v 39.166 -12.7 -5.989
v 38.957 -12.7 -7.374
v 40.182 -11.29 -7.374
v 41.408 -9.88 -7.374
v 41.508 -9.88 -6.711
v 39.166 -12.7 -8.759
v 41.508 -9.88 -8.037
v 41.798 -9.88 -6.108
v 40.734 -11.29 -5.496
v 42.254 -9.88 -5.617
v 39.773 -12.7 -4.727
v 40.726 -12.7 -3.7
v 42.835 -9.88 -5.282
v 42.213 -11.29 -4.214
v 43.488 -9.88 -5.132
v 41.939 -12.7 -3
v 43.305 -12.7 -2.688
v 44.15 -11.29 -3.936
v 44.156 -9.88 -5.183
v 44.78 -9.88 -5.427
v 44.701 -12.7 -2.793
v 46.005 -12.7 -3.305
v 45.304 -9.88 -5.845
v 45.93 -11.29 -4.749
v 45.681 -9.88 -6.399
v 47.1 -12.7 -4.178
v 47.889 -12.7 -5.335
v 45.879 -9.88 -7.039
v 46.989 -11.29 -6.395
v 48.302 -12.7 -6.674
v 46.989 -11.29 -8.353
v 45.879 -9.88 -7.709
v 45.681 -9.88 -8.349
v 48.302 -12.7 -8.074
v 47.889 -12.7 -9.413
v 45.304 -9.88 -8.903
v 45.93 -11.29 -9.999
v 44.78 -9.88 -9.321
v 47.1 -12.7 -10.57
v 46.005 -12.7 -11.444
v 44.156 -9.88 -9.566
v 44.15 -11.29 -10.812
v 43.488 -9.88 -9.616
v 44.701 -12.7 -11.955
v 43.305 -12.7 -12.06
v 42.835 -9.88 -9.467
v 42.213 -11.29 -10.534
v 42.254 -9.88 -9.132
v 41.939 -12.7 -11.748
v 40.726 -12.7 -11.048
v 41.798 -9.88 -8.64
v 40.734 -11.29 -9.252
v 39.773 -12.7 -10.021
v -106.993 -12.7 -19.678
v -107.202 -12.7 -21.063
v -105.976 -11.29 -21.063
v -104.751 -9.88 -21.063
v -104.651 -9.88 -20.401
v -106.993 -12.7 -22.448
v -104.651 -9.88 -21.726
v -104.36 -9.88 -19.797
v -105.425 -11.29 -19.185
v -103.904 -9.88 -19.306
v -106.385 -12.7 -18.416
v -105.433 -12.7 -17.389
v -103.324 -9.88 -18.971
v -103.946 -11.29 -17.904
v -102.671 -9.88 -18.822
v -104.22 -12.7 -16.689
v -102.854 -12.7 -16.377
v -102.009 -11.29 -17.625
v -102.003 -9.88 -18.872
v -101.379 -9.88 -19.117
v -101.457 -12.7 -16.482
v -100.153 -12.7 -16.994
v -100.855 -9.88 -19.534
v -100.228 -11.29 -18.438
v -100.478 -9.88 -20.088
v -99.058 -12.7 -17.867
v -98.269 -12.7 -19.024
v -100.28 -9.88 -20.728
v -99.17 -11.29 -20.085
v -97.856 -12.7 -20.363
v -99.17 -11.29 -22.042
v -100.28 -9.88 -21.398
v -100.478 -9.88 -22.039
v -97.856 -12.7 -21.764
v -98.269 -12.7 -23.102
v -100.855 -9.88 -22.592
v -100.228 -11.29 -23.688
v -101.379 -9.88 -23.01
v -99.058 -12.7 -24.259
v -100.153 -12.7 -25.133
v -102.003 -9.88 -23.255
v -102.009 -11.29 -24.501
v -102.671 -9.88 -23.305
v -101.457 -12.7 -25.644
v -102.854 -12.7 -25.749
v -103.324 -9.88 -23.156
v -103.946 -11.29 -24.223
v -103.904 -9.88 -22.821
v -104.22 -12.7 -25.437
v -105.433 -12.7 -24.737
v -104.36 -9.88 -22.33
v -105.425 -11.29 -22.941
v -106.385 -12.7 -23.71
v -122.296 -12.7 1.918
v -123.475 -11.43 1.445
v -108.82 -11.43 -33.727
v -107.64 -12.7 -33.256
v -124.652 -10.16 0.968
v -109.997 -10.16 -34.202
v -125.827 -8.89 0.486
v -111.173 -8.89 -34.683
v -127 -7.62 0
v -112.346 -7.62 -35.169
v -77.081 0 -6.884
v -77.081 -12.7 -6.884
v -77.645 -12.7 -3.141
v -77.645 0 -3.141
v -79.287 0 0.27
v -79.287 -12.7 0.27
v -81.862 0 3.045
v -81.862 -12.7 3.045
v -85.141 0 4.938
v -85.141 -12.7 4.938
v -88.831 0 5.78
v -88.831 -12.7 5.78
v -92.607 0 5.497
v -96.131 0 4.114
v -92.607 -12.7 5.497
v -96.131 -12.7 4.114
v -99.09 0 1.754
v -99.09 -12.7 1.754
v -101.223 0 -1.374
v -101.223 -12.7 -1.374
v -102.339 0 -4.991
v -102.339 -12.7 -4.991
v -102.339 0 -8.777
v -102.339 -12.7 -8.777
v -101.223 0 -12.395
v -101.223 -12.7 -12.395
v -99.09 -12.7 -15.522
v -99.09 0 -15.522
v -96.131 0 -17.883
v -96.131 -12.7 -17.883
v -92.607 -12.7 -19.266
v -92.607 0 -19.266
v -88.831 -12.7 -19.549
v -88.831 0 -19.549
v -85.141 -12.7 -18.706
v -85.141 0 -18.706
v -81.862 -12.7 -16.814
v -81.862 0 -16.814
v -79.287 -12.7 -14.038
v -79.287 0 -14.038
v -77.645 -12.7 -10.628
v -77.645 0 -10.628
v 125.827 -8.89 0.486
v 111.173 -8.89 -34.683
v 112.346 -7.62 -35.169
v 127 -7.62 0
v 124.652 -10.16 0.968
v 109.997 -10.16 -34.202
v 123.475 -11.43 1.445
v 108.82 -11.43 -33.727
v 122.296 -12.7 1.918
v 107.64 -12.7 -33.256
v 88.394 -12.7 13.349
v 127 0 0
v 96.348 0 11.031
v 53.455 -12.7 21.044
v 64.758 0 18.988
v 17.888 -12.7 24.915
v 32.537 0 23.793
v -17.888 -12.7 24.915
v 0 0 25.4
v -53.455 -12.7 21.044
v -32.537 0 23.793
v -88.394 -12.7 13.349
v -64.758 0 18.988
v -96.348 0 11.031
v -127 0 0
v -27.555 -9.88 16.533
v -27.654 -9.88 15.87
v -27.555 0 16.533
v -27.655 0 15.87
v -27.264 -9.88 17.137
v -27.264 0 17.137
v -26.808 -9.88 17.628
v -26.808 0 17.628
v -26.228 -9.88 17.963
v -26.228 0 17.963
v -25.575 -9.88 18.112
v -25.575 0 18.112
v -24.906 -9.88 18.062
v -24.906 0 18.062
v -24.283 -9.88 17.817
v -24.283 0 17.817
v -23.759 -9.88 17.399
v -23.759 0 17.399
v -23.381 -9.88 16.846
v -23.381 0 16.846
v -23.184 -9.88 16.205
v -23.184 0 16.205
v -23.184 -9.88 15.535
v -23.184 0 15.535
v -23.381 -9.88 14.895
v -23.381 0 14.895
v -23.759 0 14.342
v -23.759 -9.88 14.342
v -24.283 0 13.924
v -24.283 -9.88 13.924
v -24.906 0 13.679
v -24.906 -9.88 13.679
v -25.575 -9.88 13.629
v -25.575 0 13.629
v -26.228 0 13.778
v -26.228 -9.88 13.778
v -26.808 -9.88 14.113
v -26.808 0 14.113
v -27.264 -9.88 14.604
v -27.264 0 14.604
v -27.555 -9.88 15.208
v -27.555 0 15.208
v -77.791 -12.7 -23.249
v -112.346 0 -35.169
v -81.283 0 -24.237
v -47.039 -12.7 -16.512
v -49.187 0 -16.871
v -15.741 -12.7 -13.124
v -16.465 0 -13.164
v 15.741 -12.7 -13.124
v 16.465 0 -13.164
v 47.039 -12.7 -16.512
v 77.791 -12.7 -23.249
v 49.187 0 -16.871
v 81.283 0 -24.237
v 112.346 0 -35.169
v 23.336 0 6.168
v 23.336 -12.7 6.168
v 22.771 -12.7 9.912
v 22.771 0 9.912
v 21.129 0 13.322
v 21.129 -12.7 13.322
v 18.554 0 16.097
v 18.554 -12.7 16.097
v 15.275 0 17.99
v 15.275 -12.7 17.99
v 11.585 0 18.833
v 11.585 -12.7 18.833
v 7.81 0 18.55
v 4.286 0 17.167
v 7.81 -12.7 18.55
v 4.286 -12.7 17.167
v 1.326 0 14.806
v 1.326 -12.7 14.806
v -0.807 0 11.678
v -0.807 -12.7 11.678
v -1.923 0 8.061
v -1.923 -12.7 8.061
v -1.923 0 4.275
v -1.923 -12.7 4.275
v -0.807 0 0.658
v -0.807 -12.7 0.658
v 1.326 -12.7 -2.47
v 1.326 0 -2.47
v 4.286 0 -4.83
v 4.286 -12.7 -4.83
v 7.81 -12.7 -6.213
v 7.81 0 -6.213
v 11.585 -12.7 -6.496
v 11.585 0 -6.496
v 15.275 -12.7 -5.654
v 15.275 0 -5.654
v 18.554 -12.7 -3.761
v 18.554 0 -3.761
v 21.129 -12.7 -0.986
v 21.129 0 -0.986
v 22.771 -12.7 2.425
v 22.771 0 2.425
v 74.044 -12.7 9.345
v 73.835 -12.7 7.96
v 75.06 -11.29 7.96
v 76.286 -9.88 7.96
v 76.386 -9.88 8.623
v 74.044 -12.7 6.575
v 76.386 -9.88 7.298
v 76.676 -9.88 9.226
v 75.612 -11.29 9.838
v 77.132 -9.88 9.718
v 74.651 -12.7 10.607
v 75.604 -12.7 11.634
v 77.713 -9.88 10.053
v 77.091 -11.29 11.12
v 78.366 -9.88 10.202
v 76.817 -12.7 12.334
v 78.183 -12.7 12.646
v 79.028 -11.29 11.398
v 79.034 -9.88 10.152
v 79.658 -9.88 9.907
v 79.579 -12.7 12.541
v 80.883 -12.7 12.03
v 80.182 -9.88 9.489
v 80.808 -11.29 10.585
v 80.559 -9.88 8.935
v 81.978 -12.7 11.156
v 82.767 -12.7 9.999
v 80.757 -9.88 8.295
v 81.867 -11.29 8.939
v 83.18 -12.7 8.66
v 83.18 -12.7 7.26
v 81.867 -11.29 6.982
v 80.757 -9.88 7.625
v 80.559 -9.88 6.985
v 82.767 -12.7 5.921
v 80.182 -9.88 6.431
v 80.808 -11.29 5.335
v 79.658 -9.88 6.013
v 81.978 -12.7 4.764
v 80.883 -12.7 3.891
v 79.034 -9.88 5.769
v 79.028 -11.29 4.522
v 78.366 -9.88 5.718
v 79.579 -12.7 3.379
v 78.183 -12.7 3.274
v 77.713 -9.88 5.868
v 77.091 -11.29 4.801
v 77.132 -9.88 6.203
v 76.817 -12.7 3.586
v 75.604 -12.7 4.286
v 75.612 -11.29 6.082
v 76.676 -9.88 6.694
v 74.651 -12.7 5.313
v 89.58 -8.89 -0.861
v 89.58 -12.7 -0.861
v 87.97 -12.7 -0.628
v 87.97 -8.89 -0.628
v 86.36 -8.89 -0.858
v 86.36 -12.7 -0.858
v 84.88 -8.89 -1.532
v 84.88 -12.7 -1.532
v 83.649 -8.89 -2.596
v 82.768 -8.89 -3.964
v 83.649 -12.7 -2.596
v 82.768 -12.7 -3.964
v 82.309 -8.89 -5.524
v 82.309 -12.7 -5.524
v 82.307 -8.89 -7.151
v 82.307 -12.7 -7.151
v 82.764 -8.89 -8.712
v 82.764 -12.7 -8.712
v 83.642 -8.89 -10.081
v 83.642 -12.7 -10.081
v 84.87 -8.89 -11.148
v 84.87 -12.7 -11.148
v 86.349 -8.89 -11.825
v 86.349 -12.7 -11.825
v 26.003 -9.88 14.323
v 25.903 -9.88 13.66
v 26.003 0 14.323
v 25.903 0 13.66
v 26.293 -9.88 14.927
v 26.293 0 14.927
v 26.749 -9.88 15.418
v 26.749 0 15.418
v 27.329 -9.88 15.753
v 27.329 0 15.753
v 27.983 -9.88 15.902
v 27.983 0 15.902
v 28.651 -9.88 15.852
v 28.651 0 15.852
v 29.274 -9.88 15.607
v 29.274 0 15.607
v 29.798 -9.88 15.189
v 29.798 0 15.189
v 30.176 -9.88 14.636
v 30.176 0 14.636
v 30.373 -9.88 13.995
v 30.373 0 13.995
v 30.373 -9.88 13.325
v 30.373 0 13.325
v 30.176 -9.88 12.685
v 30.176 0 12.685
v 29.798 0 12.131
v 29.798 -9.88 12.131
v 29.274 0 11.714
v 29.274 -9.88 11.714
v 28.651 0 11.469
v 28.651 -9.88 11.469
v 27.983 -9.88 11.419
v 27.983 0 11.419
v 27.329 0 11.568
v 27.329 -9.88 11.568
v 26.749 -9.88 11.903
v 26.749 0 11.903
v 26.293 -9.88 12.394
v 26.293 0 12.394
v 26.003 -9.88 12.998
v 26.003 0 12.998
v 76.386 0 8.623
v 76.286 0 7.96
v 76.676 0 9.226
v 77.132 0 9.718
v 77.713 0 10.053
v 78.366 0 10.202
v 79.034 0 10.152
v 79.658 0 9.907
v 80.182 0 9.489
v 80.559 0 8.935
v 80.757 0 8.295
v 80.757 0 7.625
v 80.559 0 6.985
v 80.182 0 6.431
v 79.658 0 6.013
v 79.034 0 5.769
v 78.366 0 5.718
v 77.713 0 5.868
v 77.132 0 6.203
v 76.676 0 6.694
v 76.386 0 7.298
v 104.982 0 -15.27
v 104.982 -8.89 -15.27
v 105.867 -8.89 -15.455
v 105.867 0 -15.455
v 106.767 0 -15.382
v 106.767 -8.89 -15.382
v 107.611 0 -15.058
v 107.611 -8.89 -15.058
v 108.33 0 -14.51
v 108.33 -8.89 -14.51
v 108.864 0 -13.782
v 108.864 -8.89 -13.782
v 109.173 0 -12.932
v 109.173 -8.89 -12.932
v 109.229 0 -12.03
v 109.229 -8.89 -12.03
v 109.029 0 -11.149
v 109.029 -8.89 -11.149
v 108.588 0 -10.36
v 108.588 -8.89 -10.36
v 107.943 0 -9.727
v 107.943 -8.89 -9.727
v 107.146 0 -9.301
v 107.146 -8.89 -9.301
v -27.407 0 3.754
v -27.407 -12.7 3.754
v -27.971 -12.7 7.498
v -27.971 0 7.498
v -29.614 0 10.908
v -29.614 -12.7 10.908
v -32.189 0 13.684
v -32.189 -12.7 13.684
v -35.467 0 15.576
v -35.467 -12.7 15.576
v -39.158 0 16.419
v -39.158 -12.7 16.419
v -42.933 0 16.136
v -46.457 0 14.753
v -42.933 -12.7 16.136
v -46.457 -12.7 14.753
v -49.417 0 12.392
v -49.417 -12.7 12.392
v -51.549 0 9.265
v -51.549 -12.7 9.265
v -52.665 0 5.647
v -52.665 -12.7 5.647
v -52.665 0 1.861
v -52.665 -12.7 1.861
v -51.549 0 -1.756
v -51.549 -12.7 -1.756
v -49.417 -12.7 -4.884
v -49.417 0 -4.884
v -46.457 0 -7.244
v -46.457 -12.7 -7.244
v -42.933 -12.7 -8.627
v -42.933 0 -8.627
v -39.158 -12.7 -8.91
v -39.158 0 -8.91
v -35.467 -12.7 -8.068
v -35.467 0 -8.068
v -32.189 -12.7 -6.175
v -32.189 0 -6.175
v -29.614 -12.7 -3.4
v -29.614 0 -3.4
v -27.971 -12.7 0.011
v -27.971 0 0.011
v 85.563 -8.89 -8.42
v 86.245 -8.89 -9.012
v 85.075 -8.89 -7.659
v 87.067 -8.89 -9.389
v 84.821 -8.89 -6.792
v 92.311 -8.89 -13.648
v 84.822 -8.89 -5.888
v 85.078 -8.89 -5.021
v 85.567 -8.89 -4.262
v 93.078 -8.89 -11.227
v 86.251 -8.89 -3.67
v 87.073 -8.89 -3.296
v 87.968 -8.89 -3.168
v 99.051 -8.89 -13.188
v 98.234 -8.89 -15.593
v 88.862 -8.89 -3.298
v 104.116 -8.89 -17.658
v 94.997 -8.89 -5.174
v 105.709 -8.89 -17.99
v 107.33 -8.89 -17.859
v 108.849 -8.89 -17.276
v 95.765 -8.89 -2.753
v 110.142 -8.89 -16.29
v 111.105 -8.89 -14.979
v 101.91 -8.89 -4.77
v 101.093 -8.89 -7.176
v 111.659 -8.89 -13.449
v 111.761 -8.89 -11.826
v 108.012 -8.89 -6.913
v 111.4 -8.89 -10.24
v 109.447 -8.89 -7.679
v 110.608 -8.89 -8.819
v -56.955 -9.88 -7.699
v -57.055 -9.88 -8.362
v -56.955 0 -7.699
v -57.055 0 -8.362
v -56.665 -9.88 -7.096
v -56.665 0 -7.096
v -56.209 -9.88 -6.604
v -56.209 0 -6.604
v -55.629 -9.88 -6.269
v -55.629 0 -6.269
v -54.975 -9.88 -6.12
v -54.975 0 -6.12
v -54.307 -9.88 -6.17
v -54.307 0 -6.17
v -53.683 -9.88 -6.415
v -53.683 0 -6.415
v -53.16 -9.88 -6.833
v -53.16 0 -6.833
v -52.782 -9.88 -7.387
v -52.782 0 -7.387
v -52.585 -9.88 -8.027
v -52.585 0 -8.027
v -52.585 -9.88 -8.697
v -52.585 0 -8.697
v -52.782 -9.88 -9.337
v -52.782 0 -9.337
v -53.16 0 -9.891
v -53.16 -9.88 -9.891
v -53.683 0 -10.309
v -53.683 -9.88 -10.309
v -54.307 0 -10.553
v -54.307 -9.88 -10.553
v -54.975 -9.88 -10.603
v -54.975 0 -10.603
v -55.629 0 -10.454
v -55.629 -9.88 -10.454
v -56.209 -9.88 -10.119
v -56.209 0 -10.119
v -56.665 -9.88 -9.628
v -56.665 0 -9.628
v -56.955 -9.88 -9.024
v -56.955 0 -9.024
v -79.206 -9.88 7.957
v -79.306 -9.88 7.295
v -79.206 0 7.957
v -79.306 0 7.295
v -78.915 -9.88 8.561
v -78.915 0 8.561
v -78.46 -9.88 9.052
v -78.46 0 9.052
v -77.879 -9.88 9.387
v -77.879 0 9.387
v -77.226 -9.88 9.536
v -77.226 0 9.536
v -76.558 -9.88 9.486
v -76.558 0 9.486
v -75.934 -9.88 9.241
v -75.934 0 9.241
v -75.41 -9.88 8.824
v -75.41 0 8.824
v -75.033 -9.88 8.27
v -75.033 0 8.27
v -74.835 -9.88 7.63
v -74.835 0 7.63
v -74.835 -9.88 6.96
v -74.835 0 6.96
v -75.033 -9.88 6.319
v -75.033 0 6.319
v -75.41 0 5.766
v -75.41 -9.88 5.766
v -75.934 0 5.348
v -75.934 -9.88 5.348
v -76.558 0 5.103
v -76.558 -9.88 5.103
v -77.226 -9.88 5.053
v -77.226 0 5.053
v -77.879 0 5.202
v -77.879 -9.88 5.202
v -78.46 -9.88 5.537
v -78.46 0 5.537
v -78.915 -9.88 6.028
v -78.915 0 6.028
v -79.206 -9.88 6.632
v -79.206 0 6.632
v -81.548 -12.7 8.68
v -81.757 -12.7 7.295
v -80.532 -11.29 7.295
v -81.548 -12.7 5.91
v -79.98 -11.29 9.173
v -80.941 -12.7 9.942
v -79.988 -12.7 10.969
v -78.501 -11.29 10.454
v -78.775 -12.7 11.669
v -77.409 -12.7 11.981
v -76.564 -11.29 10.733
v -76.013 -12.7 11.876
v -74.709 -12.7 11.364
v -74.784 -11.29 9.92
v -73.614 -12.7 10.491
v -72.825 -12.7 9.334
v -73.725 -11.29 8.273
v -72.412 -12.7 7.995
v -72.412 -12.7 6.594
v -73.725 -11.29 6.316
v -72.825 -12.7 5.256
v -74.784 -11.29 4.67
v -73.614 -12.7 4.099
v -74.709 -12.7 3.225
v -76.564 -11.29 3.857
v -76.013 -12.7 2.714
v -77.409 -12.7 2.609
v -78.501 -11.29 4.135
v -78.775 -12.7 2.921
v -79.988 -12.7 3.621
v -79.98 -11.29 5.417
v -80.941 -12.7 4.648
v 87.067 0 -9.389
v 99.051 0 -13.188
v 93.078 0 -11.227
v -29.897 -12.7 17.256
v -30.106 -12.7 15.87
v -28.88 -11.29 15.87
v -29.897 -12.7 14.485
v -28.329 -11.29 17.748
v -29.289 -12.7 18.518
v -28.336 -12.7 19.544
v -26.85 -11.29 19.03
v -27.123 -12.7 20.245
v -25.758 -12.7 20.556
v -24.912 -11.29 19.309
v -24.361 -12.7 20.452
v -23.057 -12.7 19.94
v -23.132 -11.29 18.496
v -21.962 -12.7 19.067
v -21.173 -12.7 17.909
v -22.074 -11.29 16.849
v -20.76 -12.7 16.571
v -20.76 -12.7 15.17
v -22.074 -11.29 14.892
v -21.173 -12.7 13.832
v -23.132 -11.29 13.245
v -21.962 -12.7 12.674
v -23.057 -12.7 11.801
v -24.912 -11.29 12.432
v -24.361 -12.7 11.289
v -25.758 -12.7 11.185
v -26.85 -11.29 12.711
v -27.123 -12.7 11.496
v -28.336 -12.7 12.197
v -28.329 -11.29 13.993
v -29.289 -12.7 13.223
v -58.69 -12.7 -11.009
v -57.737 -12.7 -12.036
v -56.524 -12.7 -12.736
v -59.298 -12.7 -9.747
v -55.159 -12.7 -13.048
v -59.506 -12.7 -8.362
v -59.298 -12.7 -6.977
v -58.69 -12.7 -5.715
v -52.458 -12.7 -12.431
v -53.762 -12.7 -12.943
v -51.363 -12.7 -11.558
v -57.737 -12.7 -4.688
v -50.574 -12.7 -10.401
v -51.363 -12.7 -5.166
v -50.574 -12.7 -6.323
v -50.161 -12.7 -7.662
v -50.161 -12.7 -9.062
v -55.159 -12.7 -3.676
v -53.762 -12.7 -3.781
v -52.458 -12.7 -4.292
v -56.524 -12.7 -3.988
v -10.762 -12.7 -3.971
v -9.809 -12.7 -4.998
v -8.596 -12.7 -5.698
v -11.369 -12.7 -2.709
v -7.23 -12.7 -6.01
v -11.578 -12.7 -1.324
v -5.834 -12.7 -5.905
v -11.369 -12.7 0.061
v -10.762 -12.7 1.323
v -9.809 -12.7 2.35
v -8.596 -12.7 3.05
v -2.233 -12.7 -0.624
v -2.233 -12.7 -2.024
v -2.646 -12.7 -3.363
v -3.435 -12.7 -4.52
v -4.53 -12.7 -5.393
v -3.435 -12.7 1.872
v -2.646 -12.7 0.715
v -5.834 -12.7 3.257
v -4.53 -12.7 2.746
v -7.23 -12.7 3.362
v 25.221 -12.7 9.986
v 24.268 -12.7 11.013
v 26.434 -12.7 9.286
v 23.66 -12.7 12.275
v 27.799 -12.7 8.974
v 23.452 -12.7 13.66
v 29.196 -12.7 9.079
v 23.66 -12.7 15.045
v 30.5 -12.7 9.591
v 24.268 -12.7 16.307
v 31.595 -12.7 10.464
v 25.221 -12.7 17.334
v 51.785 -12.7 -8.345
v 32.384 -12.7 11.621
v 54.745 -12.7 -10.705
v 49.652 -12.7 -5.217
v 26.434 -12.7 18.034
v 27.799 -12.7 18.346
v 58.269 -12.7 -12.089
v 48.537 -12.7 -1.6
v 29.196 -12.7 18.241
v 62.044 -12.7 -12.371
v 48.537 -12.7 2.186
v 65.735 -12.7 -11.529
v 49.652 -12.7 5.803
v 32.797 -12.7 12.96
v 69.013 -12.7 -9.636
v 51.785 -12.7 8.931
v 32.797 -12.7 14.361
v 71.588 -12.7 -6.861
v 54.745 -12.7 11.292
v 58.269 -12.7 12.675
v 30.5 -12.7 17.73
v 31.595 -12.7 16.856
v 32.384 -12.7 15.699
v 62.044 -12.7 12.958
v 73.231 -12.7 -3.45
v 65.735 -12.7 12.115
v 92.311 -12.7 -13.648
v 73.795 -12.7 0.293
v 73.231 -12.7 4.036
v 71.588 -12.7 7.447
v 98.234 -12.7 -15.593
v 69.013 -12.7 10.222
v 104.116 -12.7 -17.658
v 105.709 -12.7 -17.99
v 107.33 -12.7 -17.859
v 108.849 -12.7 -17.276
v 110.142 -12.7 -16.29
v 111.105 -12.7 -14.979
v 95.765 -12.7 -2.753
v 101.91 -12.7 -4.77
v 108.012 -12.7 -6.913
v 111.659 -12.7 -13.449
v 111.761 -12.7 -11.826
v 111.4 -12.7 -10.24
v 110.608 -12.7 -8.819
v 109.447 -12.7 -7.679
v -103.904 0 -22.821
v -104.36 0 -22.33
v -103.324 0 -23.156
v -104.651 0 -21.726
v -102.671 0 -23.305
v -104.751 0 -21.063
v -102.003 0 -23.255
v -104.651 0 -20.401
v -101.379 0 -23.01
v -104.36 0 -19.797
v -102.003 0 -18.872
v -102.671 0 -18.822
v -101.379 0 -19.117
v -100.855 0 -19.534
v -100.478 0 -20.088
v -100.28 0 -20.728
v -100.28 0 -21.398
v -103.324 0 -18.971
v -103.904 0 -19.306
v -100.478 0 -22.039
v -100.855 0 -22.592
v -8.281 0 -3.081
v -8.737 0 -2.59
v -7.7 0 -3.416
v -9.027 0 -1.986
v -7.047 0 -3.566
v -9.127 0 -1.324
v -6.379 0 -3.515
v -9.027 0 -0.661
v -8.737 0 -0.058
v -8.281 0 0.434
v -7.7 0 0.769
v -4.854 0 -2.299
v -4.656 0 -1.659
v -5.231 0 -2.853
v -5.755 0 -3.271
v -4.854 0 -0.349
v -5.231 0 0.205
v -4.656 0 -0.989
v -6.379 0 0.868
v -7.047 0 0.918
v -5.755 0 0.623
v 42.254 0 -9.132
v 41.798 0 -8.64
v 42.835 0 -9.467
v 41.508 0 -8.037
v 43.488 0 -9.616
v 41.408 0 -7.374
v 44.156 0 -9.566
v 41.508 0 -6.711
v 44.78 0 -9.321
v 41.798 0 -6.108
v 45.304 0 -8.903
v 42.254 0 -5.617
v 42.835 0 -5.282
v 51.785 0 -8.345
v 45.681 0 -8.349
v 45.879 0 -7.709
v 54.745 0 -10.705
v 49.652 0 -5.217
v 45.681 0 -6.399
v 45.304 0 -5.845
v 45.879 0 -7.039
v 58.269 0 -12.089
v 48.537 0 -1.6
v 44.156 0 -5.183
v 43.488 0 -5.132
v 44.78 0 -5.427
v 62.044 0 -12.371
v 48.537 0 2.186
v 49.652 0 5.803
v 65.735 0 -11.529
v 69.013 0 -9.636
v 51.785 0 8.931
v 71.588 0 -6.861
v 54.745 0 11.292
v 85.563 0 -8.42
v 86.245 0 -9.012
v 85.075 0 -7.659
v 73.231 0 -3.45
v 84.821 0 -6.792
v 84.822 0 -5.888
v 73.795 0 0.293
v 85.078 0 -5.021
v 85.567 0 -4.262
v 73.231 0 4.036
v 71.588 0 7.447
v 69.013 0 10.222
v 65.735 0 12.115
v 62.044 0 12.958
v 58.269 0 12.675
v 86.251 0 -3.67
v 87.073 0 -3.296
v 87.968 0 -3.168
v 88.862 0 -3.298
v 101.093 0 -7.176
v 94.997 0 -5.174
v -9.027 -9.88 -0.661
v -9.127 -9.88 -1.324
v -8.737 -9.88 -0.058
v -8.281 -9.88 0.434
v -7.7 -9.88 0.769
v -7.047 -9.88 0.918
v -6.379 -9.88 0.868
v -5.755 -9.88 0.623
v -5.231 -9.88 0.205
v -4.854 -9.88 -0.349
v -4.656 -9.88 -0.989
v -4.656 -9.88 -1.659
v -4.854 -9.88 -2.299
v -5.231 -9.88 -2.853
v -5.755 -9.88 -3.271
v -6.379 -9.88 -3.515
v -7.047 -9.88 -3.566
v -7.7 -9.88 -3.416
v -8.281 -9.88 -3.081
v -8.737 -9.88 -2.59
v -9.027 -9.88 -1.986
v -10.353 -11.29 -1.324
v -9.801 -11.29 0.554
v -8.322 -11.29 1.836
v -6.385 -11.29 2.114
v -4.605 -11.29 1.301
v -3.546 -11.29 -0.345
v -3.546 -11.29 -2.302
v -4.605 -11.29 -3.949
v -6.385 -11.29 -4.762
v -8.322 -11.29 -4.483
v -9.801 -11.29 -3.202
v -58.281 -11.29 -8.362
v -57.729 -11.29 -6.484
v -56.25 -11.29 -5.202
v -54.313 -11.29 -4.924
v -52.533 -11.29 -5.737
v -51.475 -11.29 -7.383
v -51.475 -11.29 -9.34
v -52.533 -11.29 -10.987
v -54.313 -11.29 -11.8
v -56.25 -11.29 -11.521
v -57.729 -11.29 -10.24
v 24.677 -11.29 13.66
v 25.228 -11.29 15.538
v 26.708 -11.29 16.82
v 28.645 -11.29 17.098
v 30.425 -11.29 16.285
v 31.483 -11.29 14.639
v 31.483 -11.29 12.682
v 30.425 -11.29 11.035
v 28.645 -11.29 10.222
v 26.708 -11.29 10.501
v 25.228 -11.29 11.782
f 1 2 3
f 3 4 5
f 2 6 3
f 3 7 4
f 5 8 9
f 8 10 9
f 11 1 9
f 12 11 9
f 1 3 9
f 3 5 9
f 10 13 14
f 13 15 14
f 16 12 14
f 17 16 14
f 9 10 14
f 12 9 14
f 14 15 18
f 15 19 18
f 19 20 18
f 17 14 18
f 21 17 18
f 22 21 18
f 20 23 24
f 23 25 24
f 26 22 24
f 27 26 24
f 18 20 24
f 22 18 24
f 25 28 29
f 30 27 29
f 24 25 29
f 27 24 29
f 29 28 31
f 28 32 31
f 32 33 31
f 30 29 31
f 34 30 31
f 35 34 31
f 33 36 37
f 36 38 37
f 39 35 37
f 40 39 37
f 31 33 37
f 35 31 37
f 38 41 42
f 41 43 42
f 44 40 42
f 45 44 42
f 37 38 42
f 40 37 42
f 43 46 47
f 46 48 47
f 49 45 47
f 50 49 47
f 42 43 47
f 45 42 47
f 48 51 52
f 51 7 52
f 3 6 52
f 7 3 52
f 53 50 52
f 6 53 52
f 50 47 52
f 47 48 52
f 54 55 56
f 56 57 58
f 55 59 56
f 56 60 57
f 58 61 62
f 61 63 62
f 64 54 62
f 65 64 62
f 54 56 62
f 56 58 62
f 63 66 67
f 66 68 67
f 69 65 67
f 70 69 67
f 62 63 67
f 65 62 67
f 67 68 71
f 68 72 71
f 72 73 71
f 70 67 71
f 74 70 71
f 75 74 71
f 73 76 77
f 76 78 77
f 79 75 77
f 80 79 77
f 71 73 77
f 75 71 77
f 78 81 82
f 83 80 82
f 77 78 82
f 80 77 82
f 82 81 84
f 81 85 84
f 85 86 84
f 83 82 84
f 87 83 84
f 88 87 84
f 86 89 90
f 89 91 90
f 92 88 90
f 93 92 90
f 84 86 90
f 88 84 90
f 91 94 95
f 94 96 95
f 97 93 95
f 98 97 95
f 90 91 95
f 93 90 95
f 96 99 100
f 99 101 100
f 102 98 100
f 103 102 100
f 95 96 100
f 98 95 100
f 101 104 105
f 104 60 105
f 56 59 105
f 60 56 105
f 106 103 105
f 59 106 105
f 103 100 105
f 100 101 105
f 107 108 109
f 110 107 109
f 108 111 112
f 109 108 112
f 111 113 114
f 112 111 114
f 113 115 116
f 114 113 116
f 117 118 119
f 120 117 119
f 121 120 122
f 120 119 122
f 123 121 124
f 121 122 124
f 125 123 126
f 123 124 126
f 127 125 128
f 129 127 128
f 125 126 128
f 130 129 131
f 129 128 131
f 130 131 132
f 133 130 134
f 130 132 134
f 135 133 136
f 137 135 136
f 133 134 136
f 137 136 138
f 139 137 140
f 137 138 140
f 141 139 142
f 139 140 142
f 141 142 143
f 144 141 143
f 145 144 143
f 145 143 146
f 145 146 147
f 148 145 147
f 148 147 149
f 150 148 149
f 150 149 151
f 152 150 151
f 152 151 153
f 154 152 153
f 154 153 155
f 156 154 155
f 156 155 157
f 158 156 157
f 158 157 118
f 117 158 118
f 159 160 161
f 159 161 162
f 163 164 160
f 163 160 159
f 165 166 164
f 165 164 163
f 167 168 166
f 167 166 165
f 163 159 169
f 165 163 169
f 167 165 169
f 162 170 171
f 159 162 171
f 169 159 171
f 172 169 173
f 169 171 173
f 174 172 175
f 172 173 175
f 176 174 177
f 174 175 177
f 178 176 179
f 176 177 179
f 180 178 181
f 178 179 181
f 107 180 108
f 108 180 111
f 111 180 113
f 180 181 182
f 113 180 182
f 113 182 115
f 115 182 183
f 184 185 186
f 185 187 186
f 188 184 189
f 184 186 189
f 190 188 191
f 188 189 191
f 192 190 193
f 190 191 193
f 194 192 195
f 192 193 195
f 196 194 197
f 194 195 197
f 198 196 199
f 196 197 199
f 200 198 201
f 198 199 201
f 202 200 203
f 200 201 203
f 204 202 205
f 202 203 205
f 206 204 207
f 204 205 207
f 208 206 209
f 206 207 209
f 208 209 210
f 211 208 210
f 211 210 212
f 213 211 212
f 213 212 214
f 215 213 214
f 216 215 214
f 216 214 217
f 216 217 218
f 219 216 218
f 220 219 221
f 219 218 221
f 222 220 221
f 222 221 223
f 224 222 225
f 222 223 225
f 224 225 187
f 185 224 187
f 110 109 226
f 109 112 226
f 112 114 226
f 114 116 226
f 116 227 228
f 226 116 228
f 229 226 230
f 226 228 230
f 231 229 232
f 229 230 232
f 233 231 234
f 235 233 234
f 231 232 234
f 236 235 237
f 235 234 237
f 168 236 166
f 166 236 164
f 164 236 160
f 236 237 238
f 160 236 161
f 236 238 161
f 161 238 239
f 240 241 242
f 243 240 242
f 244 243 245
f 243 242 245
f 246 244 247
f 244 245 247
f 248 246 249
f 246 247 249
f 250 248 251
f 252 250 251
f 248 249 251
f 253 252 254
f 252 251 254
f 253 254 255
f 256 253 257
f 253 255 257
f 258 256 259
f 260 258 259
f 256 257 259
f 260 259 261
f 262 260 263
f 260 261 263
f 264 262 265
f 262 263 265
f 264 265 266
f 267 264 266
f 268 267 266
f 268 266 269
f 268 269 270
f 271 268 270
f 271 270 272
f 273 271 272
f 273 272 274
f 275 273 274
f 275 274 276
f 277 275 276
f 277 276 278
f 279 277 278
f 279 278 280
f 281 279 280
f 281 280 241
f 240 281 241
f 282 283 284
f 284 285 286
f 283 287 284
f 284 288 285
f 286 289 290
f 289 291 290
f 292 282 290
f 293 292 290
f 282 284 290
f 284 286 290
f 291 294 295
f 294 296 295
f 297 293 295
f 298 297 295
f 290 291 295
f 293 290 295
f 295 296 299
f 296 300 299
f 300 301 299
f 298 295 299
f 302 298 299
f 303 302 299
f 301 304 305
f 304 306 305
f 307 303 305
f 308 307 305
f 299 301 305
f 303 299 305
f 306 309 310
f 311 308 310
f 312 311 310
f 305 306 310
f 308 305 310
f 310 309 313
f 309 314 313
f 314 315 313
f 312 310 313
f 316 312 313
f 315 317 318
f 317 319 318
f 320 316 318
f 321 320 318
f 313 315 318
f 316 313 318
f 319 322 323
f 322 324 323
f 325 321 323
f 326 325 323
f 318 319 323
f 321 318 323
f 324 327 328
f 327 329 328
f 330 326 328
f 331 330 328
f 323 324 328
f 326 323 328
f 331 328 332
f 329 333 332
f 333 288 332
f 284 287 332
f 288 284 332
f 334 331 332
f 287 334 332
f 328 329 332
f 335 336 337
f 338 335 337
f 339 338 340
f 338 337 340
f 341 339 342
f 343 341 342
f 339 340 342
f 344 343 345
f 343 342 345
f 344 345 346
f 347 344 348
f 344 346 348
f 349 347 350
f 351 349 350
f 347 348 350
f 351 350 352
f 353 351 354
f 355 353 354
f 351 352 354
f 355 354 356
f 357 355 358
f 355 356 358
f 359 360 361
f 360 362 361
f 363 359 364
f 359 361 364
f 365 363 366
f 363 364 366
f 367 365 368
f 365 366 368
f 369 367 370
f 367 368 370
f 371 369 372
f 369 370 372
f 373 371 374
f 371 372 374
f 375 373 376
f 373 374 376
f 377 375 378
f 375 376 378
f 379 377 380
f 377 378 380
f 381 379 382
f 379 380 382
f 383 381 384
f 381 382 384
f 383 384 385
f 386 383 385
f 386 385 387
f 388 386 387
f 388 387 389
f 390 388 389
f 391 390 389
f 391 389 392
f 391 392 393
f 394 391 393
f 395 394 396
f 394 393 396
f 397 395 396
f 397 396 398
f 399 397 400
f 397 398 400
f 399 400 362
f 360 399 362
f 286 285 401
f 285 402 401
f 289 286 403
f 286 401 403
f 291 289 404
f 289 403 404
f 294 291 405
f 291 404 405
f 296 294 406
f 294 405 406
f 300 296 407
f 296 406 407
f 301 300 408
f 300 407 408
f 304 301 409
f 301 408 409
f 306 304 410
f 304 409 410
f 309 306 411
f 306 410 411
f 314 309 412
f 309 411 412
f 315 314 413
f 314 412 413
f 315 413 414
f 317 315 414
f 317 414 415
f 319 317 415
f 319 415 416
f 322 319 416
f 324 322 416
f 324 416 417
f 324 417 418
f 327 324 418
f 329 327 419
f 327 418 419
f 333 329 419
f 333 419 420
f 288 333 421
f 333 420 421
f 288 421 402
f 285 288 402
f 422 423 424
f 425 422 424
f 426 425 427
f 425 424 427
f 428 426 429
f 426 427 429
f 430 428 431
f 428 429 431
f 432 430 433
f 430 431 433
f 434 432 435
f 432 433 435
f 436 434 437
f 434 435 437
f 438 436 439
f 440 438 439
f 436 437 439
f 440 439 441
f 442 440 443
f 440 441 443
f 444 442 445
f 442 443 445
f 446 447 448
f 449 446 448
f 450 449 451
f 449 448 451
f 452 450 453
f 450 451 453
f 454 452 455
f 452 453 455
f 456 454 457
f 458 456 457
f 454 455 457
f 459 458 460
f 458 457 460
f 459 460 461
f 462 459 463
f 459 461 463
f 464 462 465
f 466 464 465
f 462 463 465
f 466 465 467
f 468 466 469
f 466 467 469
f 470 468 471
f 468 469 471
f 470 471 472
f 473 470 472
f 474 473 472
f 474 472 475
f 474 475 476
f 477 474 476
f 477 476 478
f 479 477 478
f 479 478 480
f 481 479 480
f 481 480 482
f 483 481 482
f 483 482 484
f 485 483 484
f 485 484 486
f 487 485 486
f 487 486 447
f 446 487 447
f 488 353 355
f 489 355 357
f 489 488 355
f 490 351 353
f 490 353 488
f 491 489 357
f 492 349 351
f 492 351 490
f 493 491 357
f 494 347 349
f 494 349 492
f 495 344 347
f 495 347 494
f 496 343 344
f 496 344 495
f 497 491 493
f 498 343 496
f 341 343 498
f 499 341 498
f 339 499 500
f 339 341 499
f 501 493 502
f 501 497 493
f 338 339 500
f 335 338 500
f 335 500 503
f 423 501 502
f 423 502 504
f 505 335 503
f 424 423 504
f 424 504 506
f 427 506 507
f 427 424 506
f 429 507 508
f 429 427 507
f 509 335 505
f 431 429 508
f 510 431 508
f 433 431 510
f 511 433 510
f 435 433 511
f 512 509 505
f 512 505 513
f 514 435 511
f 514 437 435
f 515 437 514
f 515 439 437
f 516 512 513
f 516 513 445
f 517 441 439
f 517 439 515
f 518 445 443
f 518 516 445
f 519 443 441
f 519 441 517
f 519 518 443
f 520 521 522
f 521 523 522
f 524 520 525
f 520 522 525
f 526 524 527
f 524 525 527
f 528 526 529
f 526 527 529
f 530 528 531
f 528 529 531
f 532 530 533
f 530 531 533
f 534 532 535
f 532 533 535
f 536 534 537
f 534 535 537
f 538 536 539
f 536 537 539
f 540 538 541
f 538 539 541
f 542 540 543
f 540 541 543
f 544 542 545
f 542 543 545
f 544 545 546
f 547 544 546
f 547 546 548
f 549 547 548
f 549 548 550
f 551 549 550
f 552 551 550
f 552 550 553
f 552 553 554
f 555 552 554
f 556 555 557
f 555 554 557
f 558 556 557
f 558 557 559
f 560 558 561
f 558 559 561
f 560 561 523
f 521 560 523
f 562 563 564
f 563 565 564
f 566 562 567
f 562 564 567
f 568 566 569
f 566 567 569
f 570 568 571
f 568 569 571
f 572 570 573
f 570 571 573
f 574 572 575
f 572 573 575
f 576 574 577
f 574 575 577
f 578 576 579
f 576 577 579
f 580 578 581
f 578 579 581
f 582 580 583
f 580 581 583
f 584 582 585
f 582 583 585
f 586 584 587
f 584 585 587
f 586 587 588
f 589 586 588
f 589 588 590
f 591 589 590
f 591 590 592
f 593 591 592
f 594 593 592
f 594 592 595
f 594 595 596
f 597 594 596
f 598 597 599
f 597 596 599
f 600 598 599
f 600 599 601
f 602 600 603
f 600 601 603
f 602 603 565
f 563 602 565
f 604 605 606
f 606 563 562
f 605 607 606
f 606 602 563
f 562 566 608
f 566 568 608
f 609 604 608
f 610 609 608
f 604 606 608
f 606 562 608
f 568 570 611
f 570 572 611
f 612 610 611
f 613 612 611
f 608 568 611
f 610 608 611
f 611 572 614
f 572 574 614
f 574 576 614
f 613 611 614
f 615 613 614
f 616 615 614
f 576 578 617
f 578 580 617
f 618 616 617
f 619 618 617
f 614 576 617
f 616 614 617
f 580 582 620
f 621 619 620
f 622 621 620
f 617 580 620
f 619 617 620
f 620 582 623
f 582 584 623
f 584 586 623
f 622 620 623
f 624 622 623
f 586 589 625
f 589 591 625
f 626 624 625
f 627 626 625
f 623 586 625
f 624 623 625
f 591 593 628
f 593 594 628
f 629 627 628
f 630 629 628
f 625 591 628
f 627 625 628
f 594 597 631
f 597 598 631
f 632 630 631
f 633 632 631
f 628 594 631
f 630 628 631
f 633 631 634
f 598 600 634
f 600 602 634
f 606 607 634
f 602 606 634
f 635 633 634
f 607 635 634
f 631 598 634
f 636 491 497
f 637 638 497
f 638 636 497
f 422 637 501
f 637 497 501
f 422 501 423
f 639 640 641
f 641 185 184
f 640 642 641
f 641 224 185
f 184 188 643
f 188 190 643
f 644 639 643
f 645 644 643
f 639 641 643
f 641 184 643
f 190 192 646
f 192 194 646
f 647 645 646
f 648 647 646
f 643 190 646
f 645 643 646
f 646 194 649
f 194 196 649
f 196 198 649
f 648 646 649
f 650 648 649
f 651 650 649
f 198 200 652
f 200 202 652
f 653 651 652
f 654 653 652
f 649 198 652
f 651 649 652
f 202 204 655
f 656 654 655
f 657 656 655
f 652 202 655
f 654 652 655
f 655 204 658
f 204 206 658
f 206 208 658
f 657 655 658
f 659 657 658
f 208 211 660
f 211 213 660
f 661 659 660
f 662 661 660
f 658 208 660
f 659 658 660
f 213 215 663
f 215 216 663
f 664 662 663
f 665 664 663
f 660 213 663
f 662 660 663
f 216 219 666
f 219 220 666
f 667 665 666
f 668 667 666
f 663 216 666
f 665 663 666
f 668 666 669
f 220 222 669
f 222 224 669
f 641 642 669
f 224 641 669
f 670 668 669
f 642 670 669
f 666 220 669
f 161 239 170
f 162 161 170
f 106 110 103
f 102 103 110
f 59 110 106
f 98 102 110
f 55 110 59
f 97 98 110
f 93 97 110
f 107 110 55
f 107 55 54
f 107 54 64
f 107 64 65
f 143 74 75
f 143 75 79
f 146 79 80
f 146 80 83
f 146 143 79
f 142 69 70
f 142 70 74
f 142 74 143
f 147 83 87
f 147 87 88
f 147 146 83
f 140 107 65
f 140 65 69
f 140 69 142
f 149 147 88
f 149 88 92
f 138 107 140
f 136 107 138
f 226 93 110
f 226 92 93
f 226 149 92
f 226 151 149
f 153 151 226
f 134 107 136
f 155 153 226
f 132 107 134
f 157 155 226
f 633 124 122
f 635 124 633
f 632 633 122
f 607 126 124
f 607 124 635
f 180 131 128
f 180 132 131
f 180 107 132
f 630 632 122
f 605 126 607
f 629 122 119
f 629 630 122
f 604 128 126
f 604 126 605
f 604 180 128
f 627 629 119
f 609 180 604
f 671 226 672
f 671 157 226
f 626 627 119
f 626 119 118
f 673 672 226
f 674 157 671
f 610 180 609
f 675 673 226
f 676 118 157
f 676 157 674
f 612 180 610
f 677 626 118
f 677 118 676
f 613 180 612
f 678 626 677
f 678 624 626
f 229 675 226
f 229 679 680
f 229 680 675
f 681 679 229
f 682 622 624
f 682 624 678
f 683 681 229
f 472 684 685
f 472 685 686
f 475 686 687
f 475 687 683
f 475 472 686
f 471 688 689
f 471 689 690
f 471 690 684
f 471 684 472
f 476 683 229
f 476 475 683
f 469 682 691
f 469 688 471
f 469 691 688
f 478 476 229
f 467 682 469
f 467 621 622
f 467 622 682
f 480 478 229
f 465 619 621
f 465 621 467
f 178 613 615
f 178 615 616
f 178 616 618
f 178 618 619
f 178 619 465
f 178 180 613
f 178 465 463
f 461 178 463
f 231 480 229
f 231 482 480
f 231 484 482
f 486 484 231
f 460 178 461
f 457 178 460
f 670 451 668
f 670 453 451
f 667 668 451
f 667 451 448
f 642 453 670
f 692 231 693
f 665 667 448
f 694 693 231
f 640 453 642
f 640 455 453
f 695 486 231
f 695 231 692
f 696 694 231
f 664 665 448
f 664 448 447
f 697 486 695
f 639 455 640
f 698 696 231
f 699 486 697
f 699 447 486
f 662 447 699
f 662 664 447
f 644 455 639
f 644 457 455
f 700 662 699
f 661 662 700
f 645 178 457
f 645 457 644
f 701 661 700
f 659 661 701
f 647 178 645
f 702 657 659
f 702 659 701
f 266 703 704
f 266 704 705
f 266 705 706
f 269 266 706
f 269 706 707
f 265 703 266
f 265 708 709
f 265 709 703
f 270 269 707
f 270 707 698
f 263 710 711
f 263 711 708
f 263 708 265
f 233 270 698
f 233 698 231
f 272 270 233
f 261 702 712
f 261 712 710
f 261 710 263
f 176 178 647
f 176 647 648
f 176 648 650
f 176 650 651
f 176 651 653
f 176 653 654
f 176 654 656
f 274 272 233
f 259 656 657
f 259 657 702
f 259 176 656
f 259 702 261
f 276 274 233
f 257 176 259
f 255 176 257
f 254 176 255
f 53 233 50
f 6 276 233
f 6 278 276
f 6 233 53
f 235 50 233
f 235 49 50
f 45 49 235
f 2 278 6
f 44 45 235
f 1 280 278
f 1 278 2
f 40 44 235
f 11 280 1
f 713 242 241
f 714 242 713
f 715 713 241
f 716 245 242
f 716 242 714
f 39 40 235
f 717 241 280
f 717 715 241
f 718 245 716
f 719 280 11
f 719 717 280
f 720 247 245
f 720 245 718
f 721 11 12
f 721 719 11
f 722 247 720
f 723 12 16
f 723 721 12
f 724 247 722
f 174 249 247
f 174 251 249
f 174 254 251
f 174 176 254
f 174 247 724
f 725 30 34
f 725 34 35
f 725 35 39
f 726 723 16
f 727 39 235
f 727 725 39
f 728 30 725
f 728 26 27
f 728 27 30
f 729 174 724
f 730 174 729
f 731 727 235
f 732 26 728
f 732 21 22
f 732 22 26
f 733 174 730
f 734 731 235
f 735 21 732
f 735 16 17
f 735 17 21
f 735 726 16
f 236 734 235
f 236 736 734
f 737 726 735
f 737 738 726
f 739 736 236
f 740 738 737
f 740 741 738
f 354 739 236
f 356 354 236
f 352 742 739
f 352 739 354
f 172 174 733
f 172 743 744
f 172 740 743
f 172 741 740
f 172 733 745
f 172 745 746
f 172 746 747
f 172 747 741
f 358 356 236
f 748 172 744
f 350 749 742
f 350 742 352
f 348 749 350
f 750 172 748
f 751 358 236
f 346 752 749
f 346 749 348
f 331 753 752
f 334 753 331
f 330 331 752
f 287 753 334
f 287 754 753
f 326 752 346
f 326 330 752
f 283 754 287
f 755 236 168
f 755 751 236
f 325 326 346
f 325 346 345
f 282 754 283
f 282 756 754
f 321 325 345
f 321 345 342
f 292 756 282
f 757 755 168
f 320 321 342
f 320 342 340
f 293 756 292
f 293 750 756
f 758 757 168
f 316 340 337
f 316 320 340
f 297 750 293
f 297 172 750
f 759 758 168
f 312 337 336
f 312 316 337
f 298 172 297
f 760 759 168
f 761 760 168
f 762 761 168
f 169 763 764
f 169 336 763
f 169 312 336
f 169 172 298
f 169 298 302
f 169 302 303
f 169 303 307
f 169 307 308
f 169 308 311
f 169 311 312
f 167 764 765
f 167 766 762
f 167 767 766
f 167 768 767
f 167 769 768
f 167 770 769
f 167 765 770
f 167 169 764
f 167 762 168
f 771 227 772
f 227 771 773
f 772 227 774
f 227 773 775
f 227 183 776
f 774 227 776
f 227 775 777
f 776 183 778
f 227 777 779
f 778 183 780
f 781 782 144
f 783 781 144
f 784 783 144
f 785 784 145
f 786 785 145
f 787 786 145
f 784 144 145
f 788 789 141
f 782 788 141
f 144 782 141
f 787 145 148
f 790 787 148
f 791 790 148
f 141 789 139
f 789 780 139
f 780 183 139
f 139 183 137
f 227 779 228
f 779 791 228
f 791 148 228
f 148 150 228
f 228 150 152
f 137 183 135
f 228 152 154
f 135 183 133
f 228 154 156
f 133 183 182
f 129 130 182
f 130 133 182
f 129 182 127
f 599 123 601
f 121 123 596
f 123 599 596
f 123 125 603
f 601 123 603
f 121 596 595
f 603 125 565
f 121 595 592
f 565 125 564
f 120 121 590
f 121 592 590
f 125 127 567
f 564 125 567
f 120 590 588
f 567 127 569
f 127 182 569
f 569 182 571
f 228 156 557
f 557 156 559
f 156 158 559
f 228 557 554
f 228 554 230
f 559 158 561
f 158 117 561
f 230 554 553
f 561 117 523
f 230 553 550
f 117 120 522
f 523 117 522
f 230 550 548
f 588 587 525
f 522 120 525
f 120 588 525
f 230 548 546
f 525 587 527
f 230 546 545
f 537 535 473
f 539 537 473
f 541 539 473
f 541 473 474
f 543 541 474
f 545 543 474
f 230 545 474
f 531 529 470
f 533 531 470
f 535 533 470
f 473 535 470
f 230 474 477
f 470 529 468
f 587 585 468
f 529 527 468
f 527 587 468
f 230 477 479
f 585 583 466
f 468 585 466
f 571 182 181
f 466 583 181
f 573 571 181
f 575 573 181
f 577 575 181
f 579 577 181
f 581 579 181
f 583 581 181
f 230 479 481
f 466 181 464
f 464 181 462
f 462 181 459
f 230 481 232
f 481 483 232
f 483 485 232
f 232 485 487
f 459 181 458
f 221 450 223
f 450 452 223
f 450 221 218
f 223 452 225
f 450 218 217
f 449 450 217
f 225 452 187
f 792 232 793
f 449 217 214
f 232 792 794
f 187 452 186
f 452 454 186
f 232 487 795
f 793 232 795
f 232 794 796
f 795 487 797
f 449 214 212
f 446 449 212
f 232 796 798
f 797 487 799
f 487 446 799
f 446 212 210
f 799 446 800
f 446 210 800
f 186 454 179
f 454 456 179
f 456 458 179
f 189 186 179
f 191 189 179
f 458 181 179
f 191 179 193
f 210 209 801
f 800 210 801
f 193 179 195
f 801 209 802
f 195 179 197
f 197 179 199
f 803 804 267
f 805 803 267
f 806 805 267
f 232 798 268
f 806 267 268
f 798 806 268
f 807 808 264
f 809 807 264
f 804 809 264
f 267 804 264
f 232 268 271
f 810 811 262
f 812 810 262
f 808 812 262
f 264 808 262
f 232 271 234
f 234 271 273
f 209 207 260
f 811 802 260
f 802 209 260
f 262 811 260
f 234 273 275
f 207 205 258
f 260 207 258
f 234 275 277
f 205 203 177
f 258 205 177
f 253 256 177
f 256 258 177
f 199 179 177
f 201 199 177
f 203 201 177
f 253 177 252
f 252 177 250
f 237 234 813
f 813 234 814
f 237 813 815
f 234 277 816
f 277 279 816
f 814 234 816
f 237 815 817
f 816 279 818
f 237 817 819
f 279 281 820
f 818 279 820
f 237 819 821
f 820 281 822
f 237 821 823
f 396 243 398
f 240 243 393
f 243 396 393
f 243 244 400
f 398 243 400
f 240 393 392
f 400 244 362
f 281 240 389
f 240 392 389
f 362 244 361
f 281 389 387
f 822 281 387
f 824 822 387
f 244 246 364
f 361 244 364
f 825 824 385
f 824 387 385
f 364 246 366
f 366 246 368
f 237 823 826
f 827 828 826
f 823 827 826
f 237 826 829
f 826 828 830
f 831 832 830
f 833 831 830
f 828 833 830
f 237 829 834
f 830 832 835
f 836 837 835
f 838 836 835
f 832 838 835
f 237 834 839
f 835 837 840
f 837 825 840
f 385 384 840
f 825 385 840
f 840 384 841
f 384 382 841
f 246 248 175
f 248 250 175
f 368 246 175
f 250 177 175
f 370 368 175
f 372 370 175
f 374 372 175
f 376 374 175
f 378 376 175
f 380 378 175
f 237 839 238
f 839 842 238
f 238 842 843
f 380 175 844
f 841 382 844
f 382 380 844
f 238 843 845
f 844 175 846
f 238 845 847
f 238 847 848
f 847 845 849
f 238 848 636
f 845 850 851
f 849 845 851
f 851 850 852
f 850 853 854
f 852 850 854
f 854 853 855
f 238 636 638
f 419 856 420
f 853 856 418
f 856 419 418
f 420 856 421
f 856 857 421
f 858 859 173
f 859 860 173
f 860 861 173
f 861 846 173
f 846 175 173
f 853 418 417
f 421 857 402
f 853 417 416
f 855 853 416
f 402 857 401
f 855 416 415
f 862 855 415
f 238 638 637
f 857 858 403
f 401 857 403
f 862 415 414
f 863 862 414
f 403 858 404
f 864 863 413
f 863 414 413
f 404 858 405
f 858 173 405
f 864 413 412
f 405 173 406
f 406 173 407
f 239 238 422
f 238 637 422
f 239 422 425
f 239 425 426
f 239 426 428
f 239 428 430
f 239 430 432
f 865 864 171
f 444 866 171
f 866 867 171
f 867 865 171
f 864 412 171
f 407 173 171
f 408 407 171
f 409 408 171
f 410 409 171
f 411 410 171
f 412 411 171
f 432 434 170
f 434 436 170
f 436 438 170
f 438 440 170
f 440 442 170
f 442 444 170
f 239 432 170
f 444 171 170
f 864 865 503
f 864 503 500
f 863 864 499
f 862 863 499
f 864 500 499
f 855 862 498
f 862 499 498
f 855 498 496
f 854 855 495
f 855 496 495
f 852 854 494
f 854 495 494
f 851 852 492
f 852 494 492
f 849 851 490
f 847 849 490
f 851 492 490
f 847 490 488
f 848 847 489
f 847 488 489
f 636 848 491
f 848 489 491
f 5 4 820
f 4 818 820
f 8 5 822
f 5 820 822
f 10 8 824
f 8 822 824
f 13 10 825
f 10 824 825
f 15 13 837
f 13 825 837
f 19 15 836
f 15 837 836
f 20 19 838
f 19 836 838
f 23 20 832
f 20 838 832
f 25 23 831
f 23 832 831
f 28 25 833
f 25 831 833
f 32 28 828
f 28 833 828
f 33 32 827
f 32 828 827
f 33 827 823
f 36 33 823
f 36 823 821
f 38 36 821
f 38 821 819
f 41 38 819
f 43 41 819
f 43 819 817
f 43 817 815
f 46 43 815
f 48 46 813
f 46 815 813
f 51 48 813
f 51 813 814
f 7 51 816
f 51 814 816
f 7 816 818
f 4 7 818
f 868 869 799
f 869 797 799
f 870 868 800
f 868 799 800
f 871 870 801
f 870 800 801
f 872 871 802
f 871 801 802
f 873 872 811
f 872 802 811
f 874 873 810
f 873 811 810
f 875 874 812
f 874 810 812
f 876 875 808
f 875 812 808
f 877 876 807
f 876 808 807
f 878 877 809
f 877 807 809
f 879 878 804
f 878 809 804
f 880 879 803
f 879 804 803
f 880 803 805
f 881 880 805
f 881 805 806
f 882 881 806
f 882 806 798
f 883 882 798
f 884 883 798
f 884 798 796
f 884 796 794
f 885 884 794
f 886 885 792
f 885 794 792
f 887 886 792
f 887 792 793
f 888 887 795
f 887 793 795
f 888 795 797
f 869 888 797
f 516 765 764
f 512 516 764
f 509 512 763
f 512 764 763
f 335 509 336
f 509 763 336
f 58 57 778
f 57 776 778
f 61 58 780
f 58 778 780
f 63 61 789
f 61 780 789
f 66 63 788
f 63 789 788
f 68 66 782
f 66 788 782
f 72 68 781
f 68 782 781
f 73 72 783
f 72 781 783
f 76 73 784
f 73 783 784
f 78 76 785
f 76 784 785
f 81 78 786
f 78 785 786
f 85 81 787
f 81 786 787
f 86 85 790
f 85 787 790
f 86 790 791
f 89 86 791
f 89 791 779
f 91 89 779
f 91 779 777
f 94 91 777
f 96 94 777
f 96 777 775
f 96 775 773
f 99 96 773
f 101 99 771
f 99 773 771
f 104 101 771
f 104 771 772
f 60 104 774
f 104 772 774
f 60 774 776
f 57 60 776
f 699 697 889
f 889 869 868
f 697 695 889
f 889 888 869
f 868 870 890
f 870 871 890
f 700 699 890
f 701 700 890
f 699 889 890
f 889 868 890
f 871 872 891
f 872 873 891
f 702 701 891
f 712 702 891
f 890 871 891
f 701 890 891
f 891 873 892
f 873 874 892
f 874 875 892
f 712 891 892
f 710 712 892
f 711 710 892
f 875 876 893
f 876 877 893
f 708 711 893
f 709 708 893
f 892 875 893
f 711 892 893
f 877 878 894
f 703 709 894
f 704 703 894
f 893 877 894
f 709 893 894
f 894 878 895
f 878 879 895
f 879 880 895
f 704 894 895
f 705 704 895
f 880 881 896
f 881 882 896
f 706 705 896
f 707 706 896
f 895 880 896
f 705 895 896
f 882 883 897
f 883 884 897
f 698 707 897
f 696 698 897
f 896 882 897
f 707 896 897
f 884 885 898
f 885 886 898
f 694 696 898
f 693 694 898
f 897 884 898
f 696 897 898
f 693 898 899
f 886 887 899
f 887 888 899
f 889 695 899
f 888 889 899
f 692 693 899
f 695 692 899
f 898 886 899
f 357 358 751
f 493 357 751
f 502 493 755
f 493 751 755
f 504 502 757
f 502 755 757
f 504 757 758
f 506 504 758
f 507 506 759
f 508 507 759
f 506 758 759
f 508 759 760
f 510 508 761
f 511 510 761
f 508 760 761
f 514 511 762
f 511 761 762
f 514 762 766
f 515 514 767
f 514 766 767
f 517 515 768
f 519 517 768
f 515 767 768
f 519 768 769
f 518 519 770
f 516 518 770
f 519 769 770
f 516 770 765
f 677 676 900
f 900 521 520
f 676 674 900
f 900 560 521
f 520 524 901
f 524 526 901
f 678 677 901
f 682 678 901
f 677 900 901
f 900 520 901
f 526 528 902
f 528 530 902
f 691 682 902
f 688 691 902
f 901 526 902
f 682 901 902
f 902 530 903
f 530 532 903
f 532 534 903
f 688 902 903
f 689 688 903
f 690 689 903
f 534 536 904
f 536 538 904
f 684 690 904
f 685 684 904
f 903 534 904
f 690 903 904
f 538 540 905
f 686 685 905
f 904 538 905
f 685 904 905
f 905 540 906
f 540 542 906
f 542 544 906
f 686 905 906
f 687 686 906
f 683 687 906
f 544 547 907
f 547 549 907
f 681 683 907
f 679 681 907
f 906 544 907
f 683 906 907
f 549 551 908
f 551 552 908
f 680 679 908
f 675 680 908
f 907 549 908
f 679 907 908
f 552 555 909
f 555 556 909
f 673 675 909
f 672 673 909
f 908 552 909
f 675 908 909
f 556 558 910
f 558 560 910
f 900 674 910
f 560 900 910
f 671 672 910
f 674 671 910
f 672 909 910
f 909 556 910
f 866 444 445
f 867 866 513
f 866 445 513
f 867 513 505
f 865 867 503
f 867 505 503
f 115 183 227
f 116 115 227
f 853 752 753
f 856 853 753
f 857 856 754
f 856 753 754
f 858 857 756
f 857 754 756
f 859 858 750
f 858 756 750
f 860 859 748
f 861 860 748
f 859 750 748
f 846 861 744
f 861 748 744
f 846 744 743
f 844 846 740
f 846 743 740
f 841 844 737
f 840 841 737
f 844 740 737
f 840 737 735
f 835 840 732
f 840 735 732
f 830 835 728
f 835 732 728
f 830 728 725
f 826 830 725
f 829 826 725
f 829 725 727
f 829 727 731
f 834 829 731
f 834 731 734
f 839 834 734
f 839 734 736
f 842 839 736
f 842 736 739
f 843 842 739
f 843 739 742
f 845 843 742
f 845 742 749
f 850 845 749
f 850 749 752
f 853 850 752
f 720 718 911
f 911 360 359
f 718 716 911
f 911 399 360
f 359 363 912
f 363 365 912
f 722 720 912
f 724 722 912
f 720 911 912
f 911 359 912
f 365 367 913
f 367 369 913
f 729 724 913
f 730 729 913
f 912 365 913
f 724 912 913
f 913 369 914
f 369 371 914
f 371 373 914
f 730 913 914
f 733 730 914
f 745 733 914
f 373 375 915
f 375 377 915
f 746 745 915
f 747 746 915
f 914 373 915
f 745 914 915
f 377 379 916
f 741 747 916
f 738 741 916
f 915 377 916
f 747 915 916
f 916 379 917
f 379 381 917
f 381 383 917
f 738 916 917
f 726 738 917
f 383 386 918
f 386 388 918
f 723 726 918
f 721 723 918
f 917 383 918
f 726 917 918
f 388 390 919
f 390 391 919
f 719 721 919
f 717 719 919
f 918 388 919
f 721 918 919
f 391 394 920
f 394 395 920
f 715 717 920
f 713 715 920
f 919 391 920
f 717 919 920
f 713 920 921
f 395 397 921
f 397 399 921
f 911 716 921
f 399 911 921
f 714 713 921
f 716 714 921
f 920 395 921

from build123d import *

# Parameters (mm, degrees)
F1_DEPTH       = 12.7
F2_R           = 12.7
F3_DEPTH       = 12.701
F4_SIZE        = 5.08
F6_D           = 4.4958
F6_CSINK_D     = 9.398
F6_CSINK_ANGLE = 82
F8_DEPTH       = 12.701
F10_DEPTH      = 3.81


with BuildPart() as f1:
    # F0 (on Front) → F1 (new body)
    with BuildSketch(Plane.XZ):
        with BuildLine():
            Line((112.346154, -35.169231), (127, 0))
            ThreePointArc((127, 0), (0, 25.4), (-127, 0))
            Line((-127, 0), (-112.346154, -35.169231))
            ThreePointArc((-112.346154, -35.169231), (0, -12.7), (112.346154, -35.169231))
        make_face()
    extrude(amount=F1_DEPTH)

    # F2 (on face) → F3 (cut, through all)
    with BuildSketch(Plane.XZ.offset(12.7)):
        with Locations((61.094761, 0.293023)):
            Circle(F2_R)
        with Locations((-89.780517, -6.884272)):
            Circle(F2_R)
        with Locations((10.635643, 6.168175)):
            Circle(F2_R)
        with Locations((-40.106974, 3.754295)):
            Circle(F2_R)
    extrude(amount=-F3_DEPTH, mode=Mode.SUBTRACT)

    # F4
    f4_edges = [f1.edges().sort_by_distance(p)[0] for p in [
        (-119.673077, -12.7, -17.584615),
        (119.673077, -12.7, -17.584615),
    ]]
    chamfer(f4_edges, length=F4_SIZE)

    # F6 (through all)
    with Locations(Plane.XZ.offset(12.7)):
        with Locations((-6.879248, -1.323894), (28.150535, 13.660243), (43.655768, -7.374051), (78.533754, 7.960097), (-77.058188, 7.294757), (-102.502846, -21.0633), (-54.807347, -8.361872), (-25.4066, 15.870463)):
            CounterSinkHole(F6_D / 2, F6_CSINK_D / 2, counter_sink_angle=F6_CSINK_ANGLE)

    # F7 (on face) → F8 (cut, through all)
    with BuildSketch(Plane.XZ.offset(12.7)):
        with BuildLine():
            ThreePointArc((104.981769, -15.270498), (109.048898, -13.367943), (107.146343, -9.300814))
            ThreePointArc((107.146343, -9.300814), (98.050229, -6.159313), (88.86221, -3.297736))
            ThreePointArc((88.86221, -3.297736), (84.919132, -5.445616), (87.067013, -9.388694))
            ThreePointArc((87.067013, -9.388694), (96.069415, -12.192461), (104.981769, -15.270498))
        make_face()
    extrude(amount=-F8_DEPTH, mode=Mode.SUBTRACT)

    # F9 (on face) → F10 (cut)
    with BuildSketch(Plane.XZ.offset(12.7)):
        with BuildLine():
            ThreePointArc((108.012172, -6.912941), (98.842554, -3.746053), (89.580289, -0.861353))
            ThreePointArc((89.580289, -0.861353), (82.482749, -4.727538), (86.348934, -11.825077))
            ThreePointArc((86.348934, -11.825077), (95.27709, -14.60572), (104.11594, -17.658371))
            ThreePointArc((104.11594, -17.658371), (111.436771, -14.233772), (108.012172, -6.912941))
        make_face()
        with BuildLine():
            ThreePointArc((88.86221, -3.297736), (98.050229, -6.159313), (107.146343, -9.300814))
            ThreePointArc((107.146343, -9.300814), (109.048898, -13.367943), (104.981769, -15.270498))
            ThreePointArc((104.981769, -15.270498), (96.069415, -12.192461), (87.067013, -9.388694))
            ThreePointArc((87.067013, -9.388694), (84.919132, -5.445616), (88.86221, -3.297736))
        make_face(mode=Mode.SUBTRACT)
    extrude(amount=-F10_DEPTH, mode=Mode.SUBTRACT)


solid = f1.part
